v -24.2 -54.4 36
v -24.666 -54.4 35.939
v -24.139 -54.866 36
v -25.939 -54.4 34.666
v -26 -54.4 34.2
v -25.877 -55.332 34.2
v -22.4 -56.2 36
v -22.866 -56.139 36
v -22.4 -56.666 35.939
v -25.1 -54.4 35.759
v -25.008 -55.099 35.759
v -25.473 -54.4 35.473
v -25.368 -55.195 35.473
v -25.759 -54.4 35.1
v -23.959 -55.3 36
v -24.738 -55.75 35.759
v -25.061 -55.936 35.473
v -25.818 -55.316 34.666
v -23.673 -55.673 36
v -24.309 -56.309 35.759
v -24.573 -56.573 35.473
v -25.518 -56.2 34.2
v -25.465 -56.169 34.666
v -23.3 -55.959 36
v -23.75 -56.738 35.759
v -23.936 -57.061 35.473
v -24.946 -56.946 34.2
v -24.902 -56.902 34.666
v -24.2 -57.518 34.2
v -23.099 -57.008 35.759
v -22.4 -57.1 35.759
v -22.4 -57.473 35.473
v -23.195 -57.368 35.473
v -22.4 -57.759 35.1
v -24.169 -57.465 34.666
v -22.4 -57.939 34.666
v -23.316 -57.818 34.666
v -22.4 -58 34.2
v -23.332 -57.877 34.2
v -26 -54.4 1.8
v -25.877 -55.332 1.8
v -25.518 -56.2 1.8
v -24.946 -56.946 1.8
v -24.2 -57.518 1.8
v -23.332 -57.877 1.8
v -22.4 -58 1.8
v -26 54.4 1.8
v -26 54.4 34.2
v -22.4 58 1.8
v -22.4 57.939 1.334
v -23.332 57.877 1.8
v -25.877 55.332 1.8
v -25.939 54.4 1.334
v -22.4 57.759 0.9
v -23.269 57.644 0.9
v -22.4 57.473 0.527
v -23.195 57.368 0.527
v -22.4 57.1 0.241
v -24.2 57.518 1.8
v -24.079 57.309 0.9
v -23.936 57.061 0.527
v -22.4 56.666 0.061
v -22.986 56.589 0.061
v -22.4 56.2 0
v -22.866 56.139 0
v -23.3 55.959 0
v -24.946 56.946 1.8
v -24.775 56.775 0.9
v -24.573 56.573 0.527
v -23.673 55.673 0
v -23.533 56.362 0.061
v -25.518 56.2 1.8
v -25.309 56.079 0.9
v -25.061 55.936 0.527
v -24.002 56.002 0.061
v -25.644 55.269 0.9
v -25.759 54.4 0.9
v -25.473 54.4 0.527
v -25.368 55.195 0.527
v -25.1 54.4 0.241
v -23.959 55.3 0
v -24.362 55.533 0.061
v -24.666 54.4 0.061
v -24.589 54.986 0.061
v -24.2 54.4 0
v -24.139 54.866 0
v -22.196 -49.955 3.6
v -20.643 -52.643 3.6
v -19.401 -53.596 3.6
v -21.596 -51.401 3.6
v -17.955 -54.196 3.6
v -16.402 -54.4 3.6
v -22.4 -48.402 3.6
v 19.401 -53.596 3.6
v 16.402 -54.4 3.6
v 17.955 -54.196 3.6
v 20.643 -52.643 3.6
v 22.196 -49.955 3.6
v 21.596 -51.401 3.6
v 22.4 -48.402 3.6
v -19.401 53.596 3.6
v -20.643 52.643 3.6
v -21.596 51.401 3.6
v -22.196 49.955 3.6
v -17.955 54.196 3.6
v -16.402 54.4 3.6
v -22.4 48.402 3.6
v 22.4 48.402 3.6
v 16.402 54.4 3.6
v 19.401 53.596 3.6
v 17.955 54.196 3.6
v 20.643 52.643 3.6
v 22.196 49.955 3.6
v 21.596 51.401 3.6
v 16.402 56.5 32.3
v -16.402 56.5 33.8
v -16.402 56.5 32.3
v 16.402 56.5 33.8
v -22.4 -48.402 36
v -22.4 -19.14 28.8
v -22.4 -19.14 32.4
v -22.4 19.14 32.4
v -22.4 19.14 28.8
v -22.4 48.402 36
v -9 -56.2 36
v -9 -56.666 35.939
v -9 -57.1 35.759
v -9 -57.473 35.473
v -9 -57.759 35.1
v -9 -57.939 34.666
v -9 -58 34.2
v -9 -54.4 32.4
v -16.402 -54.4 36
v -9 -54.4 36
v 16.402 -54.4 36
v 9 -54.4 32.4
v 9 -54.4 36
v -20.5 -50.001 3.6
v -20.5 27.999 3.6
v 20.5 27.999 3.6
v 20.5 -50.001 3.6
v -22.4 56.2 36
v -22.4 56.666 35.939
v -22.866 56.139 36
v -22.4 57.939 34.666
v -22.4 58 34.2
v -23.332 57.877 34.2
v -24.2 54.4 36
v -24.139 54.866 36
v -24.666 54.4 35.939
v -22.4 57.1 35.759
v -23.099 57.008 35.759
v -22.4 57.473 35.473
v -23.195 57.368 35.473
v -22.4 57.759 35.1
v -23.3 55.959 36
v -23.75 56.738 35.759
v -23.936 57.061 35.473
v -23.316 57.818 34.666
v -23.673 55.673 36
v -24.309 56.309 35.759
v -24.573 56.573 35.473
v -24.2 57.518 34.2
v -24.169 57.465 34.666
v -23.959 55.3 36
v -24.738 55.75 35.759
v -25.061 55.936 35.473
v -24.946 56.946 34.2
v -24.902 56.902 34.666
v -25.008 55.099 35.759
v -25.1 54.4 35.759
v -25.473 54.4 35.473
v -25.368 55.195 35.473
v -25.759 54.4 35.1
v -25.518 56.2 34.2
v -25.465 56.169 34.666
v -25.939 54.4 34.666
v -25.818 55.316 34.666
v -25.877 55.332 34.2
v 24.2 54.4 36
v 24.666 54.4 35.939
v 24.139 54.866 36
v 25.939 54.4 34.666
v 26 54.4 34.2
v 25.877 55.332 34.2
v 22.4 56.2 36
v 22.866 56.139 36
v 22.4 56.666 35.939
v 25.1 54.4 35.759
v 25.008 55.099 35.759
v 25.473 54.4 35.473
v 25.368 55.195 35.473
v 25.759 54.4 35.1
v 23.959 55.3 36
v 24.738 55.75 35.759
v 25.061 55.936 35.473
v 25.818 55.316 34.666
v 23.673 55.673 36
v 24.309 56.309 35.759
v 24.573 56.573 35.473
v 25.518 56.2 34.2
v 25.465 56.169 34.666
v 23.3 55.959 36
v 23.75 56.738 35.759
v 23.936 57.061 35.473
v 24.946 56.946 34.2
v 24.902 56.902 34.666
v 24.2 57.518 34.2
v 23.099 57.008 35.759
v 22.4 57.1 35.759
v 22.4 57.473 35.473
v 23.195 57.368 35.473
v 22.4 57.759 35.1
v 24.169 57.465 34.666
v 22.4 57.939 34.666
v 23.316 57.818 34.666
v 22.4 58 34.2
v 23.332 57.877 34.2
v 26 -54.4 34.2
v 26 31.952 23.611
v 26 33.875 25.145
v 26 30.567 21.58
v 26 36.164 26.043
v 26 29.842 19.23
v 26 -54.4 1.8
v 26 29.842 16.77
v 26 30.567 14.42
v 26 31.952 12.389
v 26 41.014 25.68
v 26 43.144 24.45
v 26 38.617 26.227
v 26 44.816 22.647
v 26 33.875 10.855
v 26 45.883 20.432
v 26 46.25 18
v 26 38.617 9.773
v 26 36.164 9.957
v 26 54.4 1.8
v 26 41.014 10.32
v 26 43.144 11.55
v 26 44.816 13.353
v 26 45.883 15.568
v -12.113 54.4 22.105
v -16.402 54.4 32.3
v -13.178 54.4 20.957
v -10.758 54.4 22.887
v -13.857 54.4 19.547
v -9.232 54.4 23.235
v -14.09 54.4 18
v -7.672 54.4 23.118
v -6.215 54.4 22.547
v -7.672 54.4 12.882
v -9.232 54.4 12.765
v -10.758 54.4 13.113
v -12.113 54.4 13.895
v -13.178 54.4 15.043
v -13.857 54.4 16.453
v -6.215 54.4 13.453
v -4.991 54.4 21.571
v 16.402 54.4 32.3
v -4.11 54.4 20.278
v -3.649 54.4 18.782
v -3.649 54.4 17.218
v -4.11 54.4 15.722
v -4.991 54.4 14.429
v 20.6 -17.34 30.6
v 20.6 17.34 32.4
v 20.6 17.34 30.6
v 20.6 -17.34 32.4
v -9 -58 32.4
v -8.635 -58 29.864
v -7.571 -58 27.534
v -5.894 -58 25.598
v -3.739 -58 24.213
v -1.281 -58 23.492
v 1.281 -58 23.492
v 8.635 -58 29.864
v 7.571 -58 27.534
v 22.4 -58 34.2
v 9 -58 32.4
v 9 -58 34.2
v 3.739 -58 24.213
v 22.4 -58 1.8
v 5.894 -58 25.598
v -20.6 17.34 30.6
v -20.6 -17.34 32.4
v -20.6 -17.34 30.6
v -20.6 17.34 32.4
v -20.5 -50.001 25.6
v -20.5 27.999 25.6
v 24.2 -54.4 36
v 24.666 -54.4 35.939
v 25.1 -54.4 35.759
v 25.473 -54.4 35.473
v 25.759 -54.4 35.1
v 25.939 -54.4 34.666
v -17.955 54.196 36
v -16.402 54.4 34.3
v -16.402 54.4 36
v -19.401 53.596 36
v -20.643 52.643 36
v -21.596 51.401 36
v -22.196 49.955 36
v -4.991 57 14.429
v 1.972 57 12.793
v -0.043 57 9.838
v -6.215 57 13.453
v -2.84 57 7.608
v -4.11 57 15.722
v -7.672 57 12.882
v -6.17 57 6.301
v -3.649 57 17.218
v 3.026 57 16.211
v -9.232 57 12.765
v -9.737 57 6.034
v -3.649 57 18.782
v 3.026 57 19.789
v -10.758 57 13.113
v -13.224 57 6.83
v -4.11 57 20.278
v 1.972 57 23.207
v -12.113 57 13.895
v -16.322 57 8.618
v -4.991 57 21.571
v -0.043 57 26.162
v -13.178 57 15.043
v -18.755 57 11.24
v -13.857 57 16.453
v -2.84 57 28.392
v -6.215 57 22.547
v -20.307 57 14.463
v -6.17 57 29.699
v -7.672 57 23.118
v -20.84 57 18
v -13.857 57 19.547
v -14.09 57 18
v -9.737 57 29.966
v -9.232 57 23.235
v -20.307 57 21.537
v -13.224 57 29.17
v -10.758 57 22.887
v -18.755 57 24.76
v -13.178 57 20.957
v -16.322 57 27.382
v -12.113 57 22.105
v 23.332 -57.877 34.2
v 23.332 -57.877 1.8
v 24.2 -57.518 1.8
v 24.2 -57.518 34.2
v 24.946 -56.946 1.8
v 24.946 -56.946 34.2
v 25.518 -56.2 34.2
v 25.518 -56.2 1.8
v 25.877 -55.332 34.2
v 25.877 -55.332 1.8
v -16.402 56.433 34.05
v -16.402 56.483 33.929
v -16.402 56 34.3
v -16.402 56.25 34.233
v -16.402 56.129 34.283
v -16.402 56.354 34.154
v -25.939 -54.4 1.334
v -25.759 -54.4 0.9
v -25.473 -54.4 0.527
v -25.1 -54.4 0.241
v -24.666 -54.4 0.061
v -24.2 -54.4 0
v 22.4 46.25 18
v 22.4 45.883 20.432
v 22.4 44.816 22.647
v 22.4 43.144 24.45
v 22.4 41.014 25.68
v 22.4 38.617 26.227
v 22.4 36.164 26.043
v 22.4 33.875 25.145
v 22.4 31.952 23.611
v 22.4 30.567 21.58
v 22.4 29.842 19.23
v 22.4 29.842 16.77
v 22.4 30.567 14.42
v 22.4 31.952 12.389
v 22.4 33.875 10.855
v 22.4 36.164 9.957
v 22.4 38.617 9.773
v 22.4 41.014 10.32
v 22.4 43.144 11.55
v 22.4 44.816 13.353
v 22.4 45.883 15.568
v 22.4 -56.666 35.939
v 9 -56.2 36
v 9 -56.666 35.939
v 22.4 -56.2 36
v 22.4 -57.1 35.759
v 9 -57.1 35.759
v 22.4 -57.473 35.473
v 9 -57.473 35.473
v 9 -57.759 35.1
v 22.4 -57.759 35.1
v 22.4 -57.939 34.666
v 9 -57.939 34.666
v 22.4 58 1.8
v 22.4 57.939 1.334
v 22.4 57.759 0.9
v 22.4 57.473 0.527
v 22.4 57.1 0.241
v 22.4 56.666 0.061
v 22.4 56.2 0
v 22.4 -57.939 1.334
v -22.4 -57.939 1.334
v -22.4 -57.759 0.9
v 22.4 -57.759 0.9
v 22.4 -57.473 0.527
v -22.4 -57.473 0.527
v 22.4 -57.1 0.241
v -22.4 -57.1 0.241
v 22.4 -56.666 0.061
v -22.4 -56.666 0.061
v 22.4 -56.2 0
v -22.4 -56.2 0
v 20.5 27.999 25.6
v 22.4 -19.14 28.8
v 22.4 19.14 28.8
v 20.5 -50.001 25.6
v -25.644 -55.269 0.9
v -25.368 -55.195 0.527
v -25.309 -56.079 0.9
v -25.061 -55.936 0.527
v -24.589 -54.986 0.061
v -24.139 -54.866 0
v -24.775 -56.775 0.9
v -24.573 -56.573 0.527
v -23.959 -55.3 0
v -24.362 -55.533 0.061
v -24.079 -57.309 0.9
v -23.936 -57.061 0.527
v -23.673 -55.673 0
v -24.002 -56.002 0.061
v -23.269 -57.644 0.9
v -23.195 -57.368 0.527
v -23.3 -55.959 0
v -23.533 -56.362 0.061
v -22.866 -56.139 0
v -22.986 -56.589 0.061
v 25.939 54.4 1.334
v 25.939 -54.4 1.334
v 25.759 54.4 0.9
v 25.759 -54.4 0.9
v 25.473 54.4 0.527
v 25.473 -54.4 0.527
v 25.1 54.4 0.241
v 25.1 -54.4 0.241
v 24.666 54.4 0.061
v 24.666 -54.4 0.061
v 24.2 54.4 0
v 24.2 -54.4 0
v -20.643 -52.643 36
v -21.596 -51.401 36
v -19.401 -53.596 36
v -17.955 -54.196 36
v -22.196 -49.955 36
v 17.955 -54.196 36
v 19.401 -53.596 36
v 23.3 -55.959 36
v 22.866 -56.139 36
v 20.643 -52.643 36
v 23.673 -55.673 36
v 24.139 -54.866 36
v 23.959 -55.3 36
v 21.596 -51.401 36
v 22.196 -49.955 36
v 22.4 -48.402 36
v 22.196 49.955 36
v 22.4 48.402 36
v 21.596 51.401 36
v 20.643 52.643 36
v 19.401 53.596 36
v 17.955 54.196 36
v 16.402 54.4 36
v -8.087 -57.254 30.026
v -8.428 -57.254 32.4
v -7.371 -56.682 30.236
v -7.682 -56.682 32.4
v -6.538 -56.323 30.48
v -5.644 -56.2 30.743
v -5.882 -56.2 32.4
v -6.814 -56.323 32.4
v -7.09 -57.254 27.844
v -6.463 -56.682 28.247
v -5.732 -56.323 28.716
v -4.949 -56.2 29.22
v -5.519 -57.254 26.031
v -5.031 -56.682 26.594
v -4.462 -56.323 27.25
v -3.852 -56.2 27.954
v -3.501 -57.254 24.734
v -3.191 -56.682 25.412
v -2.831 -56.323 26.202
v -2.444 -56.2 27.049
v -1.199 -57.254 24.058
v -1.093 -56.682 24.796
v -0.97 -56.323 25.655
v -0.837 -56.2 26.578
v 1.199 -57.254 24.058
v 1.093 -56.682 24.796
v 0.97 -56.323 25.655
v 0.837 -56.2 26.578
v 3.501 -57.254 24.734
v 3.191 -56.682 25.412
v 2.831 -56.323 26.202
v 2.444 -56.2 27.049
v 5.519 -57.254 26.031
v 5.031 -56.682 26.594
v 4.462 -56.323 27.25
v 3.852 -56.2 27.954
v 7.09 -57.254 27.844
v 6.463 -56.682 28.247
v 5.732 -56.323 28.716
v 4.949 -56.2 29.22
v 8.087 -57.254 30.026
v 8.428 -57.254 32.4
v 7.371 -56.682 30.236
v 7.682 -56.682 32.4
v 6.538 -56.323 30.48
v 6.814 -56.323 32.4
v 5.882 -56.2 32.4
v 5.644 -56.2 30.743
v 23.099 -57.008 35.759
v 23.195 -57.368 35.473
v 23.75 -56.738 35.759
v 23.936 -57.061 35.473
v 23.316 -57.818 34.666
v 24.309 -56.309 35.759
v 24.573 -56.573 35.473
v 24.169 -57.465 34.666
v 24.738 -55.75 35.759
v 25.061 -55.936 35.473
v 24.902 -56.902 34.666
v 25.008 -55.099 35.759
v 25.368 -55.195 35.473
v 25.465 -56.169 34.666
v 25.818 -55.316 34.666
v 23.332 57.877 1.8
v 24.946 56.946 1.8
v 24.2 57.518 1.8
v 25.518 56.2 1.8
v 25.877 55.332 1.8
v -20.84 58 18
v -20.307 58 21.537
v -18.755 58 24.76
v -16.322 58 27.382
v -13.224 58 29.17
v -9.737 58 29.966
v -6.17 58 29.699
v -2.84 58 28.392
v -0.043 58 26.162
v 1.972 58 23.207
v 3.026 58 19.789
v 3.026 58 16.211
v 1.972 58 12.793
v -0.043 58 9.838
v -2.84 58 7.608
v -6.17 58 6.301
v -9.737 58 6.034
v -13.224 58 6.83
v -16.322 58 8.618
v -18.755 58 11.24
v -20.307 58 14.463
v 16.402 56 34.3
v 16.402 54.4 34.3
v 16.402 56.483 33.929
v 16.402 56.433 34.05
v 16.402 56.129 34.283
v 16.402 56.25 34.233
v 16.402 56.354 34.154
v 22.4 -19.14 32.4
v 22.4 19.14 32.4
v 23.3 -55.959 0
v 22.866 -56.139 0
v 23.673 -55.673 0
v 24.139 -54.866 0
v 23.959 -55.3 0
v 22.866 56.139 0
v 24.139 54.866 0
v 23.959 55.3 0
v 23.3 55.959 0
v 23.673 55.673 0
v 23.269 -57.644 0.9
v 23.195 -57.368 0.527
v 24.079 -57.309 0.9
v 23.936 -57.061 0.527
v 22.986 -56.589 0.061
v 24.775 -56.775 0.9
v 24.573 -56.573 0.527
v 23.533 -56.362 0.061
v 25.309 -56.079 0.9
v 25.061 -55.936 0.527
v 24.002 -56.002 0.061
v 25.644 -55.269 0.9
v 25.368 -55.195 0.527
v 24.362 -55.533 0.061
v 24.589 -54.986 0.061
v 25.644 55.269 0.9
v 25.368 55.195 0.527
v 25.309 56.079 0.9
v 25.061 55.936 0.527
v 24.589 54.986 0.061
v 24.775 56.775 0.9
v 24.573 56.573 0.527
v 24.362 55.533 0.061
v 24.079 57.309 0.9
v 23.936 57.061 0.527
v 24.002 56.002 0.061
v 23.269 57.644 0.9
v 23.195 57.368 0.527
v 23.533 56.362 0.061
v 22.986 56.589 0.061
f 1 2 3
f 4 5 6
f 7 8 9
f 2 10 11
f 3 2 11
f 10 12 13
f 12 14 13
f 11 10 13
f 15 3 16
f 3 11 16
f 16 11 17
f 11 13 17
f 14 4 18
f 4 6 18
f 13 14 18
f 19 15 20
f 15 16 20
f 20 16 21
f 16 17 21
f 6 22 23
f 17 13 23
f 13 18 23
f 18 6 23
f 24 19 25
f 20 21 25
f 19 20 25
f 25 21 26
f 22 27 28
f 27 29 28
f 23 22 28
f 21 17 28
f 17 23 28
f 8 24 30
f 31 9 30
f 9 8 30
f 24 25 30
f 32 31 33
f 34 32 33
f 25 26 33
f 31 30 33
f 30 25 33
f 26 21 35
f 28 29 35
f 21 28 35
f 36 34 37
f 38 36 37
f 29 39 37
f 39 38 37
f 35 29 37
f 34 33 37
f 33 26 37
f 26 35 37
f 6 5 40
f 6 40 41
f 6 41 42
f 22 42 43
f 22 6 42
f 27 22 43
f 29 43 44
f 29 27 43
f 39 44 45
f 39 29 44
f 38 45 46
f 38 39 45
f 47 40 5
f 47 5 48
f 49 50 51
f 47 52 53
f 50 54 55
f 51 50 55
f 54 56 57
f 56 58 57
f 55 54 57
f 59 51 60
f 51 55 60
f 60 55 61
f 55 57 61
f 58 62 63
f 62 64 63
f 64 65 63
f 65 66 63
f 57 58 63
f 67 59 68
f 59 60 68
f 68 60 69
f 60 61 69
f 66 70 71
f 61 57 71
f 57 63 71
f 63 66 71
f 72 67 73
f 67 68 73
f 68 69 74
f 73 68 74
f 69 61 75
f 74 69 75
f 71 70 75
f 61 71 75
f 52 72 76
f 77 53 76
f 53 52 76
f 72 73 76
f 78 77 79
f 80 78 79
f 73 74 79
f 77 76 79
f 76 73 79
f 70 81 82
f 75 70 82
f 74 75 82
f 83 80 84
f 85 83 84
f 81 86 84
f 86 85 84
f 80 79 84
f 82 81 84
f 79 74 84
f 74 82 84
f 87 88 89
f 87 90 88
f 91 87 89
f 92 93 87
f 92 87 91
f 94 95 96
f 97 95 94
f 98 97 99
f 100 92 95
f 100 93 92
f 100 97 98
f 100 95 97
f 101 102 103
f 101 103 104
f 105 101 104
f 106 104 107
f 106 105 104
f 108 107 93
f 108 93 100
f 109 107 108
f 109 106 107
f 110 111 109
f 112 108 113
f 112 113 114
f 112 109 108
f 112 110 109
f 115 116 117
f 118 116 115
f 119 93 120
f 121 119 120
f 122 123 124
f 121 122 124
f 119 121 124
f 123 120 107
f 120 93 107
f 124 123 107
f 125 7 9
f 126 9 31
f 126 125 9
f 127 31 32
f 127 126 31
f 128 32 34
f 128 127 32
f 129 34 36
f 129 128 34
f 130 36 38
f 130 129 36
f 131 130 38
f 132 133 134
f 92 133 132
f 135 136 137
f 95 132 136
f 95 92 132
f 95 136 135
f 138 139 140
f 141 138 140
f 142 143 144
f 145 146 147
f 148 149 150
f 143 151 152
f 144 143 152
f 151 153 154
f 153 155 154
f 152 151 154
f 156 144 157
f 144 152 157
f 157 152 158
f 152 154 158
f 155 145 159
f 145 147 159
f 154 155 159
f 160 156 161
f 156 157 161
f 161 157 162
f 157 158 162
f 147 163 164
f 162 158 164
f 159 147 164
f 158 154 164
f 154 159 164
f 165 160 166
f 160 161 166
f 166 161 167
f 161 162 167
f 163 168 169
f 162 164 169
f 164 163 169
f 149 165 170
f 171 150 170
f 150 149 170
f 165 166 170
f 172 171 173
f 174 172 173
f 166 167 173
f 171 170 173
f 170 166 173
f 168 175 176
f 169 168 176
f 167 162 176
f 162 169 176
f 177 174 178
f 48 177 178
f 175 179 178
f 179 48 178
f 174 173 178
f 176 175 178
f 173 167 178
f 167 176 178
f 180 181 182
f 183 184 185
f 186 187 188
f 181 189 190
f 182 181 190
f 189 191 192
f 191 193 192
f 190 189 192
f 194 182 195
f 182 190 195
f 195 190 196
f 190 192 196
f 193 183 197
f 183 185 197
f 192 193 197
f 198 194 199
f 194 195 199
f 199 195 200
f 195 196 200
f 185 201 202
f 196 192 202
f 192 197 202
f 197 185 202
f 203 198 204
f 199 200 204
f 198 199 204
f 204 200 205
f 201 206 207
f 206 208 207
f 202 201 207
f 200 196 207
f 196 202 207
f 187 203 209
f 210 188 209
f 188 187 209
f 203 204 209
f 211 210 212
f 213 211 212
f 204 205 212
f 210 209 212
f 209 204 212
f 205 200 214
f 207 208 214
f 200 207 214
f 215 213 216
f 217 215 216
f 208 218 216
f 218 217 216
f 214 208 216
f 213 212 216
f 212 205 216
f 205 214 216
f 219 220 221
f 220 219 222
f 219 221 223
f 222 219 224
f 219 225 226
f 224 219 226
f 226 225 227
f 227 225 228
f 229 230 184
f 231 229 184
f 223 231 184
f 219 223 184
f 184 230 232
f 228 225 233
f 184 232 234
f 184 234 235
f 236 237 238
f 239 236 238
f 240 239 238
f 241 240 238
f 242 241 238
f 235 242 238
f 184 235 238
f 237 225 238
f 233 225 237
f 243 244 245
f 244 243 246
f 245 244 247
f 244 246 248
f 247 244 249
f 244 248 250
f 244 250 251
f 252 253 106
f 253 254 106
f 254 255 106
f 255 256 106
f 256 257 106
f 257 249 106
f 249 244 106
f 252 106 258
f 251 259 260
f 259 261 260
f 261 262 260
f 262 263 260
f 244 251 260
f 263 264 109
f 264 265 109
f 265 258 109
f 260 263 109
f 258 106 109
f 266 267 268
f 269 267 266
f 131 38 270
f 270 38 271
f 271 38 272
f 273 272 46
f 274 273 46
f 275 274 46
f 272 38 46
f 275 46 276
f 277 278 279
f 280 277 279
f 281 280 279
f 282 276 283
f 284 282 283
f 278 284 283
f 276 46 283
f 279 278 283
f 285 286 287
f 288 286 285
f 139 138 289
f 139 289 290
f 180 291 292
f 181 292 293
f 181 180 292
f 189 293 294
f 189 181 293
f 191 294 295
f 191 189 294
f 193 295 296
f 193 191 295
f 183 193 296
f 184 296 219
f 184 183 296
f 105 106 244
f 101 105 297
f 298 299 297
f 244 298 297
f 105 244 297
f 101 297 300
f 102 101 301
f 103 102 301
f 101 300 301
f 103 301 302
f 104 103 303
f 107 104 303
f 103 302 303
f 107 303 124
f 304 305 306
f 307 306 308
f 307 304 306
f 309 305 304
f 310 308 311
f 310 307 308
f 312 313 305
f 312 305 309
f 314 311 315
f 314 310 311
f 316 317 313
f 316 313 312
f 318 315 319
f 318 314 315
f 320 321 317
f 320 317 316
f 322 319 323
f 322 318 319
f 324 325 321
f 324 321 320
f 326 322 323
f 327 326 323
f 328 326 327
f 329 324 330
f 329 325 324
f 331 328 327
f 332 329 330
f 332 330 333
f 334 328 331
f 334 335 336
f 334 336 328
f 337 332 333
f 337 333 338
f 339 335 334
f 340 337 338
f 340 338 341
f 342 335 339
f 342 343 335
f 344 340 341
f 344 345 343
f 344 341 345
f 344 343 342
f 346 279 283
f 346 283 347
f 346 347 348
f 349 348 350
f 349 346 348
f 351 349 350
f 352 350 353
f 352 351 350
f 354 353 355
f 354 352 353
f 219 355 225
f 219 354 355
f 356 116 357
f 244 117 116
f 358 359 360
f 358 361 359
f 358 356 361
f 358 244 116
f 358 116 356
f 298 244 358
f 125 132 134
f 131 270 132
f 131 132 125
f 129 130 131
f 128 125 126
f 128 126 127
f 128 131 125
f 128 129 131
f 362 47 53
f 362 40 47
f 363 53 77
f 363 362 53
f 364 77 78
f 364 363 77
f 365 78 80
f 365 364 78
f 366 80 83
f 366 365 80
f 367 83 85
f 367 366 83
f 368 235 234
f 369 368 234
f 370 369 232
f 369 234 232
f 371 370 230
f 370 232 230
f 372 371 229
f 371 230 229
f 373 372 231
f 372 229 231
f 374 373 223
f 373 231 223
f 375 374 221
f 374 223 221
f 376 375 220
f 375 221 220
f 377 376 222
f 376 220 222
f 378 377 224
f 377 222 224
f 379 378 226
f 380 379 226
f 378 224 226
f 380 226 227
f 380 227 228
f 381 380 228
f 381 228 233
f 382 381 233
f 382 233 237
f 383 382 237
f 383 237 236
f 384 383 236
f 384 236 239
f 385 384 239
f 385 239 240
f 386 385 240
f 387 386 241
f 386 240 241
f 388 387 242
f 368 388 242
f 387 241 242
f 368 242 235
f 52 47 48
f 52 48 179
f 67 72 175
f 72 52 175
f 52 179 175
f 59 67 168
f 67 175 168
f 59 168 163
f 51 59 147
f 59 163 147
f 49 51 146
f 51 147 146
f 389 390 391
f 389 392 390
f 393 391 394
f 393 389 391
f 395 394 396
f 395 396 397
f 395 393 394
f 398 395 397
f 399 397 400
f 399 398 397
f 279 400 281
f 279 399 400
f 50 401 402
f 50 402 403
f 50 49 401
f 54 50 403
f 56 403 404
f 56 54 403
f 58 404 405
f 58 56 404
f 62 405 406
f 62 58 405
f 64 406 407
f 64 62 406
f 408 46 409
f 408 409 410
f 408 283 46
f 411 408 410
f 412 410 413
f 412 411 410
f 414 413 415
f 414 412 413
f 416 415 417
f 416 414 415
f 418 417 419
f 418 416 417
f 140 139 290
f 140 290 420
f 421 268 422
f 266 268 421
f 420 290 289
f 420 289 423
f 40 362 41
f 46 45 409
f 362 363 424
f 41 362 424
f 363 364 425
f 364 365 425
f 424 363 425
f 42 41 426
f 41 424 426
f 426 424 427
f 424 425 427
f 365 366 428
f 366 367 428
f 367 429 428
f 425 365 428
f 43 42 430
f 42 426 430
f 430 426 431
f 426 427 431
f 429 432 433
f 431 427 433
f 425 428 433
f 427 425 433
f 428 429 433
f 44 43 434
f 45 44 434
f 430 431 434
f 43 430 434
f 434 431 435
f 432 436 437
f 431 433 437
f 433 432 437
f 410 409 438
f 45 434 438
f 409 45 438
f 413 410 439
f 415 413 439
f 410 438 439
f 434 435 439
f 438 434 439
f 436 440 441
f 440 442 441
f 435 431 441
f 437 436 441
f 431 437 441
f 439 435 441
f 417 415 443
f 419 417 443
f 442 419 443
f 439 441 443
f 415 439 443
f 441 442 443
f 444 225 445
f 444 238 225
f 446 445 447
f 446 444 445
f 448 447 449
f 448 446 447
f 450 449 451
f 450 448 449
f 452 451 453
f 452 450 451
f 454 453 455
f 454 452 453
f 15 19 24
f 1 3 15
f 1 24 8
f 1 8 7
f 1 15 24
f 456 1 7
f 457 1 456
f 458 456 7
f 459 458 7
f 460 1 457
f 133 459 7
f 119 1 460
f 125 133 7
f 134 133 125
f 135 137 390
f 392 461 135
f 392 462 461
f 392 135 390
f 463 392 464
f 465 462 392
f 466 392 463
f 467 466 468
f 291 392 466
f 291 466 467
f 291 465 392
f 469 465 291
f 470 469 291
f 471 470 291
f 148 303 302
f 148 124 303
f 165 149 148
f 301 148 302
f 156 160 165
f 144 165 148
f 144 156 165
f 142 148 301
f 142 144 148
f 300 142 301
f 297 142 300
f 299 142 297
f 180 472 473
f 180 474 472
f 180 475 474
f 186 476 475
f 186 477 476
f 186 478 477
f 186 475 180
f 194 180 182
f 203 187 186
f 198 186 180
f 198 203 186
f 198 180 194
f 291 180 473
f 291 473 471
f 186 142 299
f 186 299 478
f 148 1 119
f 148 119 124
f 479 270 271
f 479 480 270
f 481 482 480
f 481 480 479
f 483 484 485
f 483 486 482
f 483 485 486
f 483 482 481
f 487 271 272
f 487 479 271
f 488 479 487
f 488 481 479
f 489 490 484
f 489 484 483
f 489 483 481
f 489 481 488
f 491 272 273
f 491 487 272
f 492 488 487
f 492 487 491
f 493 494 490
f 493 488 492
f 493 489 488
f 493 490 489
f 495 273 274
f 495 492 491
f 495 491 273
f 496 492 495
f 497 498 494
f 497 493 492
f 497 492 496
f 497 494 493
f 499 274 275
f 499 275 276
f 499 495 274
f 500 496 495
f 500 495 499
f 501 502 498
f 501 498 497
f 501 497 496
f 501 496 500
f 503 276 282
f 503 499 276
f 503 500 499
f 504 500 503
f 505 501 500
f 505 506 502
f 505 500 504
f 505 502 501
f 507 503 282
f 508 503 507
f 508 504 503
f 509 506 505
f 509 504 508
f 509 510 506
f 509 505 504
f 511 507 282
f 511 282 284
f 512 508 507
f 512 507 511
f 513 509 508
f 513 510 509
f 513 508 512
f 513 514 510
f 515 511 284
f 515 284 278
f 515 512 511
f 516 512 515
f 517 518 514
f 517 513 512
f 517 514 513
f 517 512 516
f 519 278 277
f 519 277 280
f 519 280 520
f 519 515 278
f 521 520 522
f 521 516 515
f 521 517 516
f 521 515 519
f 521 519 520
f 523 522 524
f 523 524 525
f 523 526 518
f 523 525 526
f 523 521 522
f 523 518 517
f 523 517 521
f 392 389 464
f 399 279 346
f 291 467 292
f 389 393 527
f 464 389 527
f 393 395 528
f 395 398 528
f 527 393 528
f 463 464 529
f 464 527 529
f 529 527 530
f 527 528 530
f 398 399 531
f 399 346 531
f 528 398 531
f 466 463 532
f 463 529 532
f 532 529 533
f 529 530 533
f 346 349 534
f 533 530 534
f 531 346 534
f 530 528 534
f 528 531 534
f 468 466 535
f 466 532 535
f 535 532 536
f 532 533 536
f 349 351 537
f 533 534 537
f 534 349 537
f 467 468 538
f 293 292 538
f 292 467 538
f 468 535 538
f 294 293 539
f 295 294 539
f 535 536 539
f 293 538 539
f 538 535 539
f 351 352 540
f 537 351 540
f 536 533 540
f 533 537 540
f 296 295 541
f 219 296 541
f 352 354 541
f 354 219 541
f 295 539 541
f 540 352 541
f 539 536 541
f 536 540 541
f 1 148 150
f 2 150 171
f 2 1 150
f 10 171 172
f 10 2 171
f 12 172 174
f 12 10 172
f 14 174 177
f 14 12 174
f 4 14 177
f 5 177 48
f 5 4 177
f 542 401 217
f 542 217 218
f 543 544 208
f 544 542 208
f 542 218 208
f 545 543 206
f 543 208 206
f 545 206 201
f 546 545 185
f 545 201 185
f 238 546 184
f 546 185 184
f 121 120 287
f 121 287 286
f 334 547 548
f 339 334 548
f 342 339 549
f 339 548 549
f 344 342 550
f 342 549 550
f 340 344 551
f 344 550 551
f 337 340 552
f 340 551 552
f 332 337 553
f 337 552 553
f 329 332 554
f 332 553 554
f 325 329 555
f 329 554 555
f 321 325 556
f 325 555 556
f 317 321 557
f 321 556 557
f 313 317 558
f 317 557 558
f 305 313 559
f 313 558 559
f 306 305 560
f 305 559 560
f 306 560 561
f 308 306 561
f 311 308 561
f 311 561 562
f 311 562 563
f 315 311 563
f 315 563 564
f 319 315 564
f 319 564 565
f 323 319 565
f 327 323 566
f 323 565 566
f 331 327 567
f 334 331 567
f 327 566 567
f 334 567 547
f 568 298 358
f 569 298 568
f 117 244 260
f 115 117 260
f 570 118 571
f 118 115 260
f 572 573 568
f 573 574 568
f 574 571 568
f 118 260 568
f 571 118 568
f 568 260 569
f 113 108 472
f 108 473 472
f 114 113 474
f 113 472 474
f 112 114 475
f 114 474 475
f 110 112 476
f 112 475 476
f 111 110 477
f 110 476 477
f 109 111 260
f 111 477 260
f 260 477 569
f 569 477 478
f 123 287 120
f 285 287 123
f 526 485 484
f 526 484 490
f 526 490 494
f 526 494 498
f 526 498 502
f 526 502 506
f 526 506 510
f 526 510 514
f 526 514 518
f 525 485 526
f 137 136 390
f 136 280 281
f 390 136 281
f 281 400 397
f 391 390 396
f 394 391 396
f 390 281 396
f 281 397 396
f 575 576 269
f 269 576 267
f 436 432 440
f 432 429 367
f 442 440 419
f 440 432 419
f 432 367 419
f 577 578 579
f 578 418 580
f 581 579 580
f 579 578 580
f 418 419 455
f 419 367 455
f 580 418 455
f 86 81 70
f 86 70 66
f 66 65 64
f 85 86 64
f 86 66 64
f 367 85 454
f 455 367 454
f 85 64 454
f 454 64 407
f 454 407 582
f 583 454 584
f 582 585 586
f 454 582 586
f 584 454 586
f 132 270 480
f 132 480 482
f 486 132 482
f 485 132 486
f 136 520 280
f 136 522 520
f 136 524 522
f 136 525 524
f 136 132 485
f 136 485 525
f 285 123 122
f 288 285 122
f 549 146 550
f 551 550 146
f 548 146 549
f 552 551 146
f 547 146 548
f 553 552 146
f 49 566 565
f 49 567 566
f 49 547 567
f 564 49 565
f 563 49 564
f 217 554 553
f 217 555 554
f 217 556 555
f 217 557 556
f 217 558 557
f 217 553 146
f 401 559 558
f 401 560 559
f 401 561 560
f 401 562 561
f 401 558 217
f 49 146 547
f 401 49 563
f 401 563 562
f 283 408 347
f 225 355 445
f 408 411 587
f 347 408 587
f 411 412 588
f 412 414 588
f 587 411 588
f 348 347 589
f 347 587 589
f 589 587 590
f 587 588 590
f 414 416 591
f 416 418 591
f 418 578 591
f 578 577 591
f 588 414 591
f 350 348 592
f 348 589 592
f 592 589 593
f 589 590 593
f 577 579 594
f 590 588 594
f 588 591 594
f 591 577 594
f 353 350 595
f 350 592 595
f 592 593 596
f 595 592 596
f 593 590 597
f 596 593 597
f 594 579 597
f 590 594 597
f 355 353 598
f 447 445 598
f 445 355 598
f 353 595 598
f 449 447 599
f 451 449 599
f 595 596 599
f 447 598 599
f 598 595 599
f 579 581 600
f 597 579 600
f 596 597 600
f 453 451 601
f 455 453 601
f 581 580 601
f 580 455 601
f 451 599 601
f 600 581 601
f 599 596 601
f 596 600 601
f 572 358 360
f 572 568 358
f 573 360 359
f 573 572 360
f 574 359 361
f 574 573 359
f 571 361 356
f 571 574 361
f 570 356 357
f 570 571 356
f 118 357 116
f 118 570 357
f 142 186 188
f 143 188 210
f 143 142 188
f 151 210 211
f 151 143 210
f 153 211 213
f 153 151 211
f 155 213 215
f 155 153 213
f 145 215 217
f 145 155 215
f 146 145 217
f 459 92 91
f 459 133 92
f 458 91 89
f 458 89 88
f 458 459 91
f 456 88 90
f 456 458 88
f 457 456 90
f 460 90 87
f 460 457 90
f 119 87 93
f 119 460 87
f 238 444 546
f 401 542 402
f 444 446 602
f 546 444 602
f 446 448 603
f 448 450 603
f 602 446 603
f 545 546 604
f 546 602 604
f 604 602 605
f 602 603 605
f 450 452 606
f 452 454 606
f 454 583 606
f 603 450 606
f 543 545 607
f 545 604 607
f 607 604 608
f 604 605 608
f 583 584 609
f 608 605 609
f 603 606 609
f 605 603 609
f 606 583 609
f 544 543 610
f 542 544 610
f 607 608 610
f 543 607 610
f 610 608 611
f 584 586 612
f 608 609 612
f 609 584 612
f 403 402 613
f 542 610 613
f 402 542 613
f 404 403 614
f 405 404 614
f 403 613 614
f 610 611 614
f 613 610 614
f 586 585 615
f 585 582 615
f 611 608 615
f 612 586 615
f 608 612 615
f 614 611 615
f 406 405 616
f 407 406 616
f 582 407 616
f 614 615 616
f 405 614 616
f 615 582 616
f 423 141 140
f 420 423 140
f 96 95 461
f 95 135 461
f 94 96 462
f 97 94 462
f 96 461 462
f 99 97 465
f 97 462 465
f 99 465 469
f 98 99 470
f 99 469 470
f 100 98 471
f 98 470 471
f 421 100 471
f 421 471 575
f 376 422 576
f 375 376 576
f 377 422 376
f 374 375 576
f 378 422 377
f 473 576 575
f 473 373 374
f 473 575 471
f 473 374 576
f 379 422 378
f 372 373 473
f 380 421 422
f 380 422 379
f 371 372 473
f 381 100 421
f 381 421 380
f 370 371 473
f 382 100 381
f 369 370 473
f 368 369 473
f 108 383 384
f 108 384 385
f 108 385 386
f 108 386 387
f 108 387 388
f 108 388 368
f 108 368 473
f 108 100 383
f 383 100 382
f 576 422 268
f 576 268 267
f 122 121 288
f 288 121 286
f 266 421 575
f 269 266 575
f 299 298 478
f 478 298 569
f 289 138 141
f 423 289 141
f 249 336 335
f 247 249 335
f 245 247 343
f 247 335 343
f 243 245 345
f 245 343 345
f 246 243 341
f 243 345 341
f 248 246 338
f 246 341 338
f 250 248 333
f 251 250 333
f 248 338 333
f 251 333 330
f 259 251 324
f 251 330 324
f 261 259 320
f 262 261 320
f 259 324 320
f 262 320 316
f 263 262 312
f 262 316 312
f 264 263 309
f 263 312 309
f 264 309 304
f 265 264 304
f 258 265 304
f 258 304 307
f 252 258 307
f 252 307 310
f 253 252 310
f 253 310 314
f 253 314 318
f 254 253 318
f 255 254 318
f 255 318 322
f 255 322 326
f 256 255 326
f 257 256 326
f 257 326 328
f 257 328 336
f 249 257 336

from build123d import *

# Parameters (mm, degrees)
F2_W         = 52
F2_H         = 116
F2_W_2       = 44.8
F2_H_2       = 108.8
F3_DEPTH     = 36
F4_DEPTH     = 3.6
F7_R         = 3.6
F8_R         = 5.9976
F6_R         = 5.25
F9_DEPTH     = 3.6
F5_R         = 8.25
F10_DEPTH    = 3.6
F11_W        = 18
F11_H        = 3.6
F12_DEPTH    = 3.6
F13_W        = 32.8048
F13_H        = 2
F14_DEPTH    = 2.1
F15_R        = 1.8
F6_R_2       = 12
F17_DEPTH    = 1
F18_R        = 0.5
F19_W        = 38.28
F19_H        = 3.6
F21_DEPTH    = 1.8
F20_W        = 38.28
F20_H        = 3.6
F22_DEPTH    = 1.8
F23_SIZE     = 1.79999
F25_DEPTH    = 1.8
F26_T2_ANGLE = 180
F27_W        = 41
F27_H        = 78
F28_DEPTH    = 22


# Not quite as in the source:
# - a fillet or chamfer that OpenCascade refuses, or shapes differently, is made with other operations: its cross-section is extruded or revolved along the edge and cut away or added
# - a fillet or chamfer is up to 0.001 mm smaller than in the source, because OpenCascade refuses the exact size
# - a feature of the source that left no trace in its solid (it failed there, or was rolled back) is left out


with BuildPart() as f3:
    # F2 (on Top) → F3 (new body)
    with BuildSketch(Plane.XY):
        Rectangle(F2_W, F2_H)
        Rectangle(F2_W_2, F2_H_2, mode=Mode.SUBTRACT)
    extrude(amount=F3_DEPTH)

    # F2 (on Top) → F4 (join)
    with BuildSketch(Plane.XY):
        Rectangle(F2_W_2, F2_H_2)
    extrude(amount=F4_DEPTH)

    # F7
    f7_edges = [f3.edges().sort_by_distance(p)[0] for p in [
        (26, 58, 18),
        (-26, 58, 18),
        (-26, -58, 18),
        (26, -58, 18),
    ]]
    fillet(f7_edges, radius=F7_R)

    # F8
    f8_edges = [f3.edges().sort_by_distance(p)[0] for p in [
        (-22.4, -54.4, 19.8),
        (22.4, -54.4, 19.8),
        (22.4, 54.4, 19.8),
        (-22.4, 54.4, 19.8),
    ]]
    fillet(f8_edges, radius=F8_R)

    # F6 (on face) → F9 (cut)
    with BuildSketch(Plane(origin=(0, 58, 0), x_dir=(-1, 0, 0), z_dir=(0, 1, 0))):
        with Locations((8.84, 18)):
            Circle(F6_R)
    extrude(amount=-F9_DEPTH, mode=Mode.SUBTRACT)

    # F5 (on face) → F10 (cut)
    with BuildSketch(Plane.YZ.offset(26)):
        with Locations((38, 18)):
            Circle(F5_R)
    extrude(amount=-F10_DEPTH, mode=Mode.SUBTRACT)

    # F11 (on face) → F12 (cut)
    with BuildSketch(Plane.XZ.offset(58)):
        with Locations((0, 34.2)):
            Rectangle(F11_W, F11_H)
    extrude(amount=-F12_DEPTH, mode=Mode.SUBTRACT)

    # F13 (on face) → F14 (cut)
    with BuildSketch(Plane.XZ.offset(-54.4)):
        with Locations((0, 33.3)):
            Rectangle(F13_W, F13_H)
    extrude(amount=-F14_DEPTH, mode=Mode.SUBTRACT)

    # F15
    f15_edges = [f3.edges().sort_by_distance(p)[0] for p in [
        (15.7, -58, 36),
        (24.945584, -56.945584, 36),
        (26, 0, 36),
        (-15.7, -58, 36),
        (-24.945584, -56.945584, 36),
        (-26, 0, 36),
        (-24.945584, 56.945584, 36),
        (0, 58, 36),
        (24.945584, 56.945584, 36),
        (0, -58, 0),
        (-24.945584, -56.945584, 0),
        (-26, 0, 0),
        (-24.945584, 56.945584, 0),
        (0, 58, 0),
        (24.945584, 56.945584, 0),
        (26, 0, 0),
        (24.945584, -56.945584, 0),
    ]]
    fillet(f15_edges, radius=F15_R)

    # F6 (on face) → F17 (cut)
    with BuildSketch(Plane(origin=(0, 58, 0), x_dir=(-1, 0, 0), z_dir=(0, 1, 0))):
        with Locations((8.84, 18)):
            Circle(F6_R_2)
        with Locations((8.84, 18)):
            Circle(F6_R, mode=Mode.SUBTRACT)
    extrude(amount=-F17_DEPTH, mode=Mode.SUBTRACT)

    # F18
    f18_edges = [f3.edges().sort_by_distance(p)[0] for p in [
        (0, 56.5, 34.3),
    ]]
    fillet(f18_edges, radius=F18_R)

    # F19 (on face) → F21 (join)
    with BuildSketch(Plane(origin=(22.4, 0, 0), x_dir=(0, -1, 0), z_dir=(-1, 0, 0))):
        with Locations((0, 30.6)):
            Rectangle(F19_W, F19_H)
    extrude(amount=F21_DEPTH)

    # F20 (on face) → F22 (join)
    with BuildSketch(Plane.YZ.offset(-22.4)):
        with Locations((0, 30.6)):
            Rectangle(F20_W, F20_H)
    extrude(amount=F22_DEPTH)

    # F23 (size 1.8 in the source; OpenCascade refuses exactly that, so slightly less here)
    f23_edges = [f3.edges().sort_by_distance(p)[0] for p in [
        (-20.6, -19.14, 30.6),
        (-20.6, 0, 28.8),
        (-20.6, 19.14, 30.6),
        (20.6, 19.14, 30.6),
        (20.6, 0, 28.8),
        (20.6, -19.14, 30.6),
    ]]
    chamfer(f23_edges, length=F23_SIZE)

    # F11 (on face) → F25 (cut)
    with BuildSketch(Plane.XZ.offset(58)):
        with BuildLine():
            ThreePointArc((-9, 32.4), (0, 23.4), (9, 32.4))
            Line((9, 32.4), (-9, 32.4))
        make_face()
    extrude(amount=-F25_DEPTH, mode=Mode.SUBTRACT)

    # F26: fillet of radius 3.6 on 1 edges, made by hand

    # F26_s1 → F26_t2 (revolve)
    with BuildSketch(Plane.XY.offset(32.4)):
        with BuildLine():
            ThreePointArc((-9, -58), (-7.6823085464, -56.6823085464), (-5.8823085464, -56.2))
            Line((-5.8823085464, -56.2), (-9, -56.2))
            Line((-9, -56.2), (-9, -58))
        make_face()
    revolve(axis=Axis((0, -56.2, 32.4), (0, -1, 0)), revolution_arc=F26_T2_ANGLE)


with BuildPart() as f28:
    # F27 (on face) → F28 (new body)
    with BuildSketch(Plane.XY.offset(3.6)):
        with Locations((0, -11.0006080357)):
            Rectangle(F27_W, F27_H)
    extrude(amount=F28_DEPTH)


solid = Compound([f3.part, f28.part])
